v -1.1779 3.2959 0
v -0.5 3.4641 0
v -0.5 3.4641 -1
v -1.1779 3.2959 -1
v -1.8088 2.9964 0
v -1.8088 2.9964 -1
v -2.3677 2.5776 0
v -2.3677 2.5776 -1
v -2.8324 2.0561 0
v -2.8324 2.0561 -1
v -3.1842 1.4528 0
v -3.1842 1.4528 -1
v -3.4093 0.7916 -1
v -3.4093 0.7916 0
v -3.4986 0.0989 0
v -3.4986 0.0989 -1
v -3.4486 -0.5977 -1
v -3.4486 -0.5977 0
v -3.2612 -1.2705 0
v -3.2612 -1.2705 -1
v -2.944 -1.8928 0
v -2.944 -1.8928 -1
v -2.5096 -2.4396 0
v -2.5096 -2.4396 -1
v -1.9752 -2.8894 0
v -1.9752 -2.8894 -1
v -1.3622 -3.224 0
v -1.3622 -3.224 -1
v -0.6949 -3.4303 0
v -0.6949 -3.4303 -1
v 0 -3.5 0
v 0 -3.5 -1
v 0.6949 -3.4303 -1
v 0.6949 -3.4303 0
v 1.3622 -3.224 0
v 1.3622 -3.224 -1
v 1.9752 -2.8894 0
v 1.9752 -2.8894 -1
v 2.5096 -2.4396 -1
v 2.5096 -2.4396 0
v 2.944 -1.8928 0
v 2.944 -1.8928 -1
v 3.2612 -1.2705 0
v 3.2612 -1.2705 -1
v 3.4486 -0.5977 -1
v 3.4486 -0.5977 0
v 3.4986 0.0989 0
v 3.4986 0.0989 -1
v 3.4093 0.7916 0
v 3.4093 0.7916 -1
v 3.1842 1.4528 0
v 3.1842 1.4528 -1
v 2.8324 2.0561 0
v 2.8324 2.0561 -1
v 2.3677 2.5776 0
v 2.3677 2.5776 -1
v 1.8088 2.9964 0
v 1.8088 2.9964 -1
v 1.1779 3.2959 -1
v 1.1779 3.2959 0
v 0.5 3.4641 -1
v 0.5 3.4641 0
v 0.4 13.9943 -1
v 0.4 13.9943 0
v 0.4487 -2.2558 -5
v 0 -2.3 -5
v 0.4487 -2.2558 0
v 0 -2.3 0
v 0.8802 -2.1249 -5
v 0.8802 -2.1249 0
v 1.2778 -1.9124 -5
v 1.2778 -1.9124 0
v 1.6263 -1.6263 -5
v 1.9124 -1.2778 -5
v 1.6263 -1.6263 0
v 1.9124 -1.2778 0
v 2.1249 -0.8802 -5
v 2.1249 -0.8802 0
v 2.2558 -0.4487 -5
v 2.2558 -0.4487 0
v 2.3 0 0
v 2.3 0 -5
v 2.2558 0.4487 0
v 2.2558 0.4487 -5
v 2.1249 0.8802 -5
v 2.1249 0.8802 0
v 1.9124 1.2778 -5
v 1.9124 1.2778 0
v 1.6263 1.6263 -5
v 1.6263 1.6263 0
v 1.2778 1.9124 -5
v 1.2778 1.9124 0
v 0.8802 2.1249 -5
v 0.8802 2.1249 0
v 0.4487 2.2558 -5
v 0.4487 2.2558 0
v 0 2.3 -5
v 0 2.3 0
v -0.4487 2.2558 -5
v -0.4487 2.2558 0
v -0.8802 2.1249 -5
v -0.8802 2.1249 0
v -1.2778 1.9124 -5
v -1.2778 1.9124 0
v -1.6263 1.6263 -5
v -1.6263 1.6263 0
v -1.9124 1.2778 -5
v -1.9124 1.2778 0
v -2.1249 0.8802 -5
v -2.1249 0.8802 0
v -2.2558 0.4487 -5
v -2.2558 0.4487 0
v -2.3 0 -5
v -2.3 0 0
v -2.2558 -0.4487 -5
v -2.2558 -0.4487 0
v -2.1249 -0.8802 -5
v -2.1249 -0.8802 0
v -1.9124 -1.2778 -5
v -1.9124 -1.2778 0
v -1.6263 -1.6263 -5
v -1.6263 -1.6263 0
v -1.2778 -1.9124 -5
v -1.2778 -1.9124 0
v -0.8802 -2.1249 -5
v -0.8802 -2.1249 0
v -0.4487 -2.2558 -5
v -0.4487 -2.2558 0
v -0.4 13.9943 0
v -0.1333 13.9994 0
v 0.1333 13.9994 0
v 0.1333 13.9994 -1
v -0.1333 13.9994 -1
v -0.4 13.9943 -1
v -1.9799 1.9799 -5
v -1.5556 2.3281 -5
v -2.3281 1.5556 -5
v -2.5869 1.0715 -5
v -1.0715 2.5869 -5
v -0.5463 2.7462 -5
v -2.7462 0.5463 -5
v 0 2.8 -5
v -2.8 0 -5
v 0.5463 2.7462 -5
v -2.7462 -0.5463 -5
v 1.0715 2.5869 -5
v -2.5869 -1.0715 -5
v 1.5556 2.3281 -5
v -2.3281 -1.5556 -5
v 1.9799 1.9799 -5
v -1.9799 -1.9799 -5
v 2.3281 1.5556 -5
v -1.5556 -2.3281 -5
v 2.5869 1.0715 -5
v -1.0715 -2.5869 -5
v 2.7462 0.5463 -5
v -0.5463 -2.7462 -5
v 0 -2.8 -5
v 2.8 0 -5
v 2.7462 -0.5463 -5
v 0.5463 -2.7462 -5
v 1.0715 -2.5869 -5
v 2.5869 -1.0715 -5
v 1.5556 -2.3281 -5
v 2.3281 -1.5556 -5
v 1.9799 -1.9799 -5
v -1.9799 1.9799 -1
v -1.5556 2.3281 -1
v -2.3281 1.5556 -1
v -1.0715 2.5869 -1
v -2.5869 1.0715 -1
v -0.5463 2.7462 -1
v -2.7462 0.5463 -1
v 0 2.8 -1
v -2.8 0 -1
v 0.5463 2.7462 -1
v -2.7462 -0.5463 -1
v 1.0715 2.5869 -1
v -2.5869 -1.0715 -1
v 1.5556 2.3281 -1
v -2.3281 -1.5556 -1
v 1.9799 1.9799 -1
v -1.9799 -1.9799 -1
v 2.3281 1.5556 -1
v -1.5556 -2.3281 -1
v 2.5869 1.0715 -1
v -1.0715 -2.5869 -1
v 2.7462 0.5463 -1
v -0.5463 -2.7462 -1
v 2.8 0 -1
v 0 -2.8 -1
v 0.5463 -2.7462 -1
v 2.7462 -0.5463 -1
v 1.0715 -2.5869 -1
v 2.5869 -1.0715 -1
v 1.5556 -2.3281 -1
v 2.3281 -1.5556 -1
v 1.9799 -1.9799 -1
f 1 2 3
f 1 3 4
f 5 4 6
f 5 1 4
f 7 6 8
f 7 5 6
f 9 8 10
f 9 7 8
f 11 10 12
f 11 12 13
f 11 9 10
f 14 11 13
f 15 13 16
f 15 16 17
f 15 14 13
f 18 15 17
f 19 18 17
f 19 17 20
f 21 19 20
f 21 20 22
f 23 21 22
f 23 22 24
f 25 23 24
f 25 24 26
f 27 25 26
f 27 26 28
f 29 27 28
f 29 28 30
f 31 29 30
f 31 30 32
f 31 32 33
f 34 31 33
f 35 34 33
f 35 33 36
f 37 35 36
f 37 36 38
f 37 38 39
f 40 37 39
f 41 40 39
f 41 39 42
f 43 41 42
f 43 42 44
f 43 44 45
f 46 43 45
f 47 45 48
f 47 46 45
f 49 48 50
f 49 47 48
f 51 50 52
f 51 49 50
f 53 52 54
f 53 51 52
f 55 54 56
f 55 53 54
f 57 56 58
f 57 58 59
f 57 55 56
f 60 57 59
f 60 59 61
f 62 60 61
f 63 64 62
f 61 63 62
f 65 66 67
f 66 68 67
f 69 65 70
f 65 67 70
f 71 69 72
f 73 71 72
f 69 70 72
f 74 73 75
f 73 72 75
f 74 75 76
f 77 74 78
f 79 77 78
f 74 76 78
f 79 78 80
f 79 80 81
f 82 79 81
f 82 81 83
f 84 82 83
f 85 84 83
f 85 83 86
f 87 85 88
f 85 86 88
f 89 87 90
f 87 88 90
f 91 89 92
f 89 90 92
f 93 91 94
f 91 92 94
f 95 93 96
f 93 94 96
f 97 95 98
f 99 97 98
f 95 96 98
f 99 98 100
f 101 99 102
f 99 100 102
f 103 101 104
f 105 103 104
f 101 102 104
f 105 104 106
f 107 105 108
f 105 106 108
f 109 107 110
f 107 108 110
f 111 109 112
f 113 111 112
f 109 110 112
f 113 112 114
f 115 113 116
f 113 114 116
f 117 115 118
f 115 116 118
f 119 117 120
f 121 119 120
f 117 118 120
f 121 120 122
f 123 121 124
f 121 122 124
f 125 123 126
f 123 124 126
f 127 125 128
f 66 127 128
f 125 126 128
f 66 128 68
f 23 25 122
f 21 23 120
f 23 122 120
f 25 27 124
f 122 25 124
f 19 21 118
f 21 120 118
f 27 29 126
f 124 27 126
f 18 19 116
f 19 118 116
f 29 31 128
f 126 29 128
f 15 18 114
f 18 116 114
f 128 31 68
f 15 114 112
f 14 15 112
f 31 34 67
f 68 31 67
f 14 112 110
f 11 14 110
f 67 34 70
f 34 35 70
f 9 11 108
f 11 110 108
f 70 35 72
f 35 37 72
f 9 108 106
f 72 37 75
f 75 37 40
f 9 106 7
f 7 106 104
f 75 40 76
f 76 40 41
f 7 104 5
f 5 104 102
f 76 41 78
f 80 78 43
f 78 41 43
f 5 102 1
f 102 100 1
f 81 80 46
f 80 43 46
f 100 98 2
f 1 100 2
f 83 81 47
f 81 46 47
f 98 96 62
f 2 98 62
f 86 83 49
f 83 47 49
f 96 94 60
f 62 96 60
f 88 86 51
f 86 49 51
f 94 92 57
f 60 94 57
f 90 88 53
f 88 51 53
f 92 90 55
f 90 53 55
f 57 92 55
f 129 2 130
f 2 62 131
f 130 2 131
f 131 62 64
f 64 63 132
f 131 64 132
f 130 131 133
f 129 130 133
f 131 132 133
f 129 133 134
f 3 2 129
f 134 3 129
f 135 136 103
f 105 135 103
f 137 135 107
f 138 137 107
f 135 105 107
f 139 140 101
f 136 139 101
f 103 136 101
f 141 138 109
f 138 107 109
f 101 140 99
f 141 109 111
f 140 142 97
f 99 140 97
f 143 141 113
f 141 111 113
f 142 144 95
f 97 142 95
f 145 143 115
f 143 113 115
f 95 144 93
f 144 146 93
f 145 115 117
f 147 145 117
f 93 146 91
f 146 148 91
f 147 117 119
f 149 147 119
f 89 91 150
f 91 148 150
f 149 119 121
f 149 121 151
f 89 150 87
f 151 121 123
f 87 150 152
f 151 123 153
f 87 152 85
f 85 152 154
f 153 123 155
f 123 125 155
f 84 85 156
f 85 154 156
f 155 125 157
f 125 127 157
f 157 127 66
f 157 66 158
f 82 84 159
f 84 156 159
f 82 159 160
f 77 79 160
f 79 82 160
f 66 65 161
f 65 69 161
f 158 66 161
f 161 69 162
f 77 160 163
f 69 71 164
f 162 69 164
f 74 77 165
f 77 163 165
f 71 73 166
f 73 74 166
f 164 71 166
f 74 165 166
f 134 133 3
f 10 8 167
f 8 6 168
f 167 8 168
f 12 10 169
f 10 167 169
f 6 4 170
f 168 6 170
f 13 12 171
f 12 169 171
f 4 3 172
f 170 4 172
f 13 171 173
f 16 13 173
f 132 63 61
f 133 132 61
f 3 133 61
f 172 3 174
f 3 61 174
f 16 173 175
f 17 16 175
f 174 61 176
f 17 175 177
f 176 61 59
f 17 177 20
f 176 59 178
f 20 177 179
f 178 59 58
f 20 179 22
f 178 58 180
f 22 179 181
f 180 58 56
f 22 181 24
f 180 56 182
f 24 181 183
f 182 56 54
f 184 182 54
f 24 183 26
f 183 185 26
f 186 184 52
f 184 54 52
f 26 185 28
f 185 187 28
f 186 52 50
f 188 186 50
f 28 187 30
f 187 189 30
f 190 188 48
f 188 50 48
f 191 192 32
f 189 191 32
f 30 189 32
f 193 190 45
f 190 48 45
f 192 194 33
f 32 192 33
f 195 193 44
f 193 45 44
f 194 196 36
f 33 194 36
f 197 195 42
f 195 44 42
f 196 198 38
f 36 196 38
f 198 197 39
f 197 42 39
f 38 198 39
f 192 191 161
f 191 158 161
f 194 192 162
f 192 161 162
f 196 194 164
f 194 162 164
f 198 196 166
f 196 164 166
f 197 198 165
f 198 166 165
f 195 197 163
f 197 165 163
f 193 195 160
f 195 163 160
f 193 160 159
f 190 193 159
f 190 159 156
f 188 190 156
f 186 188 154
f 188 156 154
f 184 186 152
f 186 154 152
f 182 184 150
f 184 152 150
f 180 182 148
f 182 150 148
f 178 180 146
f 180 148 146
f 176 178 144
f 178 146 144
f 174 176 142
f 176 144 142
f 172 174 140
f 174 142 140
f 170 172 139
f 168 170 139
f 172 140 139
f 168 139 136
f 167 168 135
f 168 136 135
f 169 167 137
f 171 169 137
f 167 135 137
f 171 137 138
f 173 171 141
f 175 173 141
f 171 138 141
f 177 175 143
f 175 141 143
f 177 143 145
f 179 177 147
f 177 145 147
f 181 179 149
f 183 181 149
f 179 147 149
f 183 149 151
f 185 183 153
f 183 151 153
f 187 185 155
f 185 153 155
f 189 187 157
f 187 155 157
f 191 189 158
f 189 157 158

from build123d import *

# Parameters (mm, degrees)
POCKET_DEPTH = 5.001


with BuildPart() as part:
    # Sketch → Revolution (revolve)
    with BuildSketch(Plane.YZ):
        Polygon((-14, 0), (-14, -1), (-2.8, -1), (-2.8, -5), (-2.3, -5), (-2.3, 0), align=None)
    revolve(axis=Axis((0, 0, 0), (0, 0, 1)))

    # Sketch001 (on Face6 of Revolution) → Pocket (cut, through all)
    with BuildSketch(Plane(origin=(0, 0, 0), x_dir=(0, -1, 0), z_dir=(0, 0, 1))):
        with BuildLine():
            Line((-13.9942845476, 0.4), (-3.4641016151, 0.5))
            ThreePointArc((-3.4641016151, -0.5), (3.5, 0), (-3.4641016151, 0.5))
            Line((-3.4641016151, -0.5), (-13.9942845476, -0.4))
            ThreePointArc((-13.9942845476, -0.4), (14, 0), (-13.9942845476, 0.4))
        make_face()
    extrude(amount=-POCKET_DEPTH, mode=Mode.SUBTRACT)


solid = part.part
